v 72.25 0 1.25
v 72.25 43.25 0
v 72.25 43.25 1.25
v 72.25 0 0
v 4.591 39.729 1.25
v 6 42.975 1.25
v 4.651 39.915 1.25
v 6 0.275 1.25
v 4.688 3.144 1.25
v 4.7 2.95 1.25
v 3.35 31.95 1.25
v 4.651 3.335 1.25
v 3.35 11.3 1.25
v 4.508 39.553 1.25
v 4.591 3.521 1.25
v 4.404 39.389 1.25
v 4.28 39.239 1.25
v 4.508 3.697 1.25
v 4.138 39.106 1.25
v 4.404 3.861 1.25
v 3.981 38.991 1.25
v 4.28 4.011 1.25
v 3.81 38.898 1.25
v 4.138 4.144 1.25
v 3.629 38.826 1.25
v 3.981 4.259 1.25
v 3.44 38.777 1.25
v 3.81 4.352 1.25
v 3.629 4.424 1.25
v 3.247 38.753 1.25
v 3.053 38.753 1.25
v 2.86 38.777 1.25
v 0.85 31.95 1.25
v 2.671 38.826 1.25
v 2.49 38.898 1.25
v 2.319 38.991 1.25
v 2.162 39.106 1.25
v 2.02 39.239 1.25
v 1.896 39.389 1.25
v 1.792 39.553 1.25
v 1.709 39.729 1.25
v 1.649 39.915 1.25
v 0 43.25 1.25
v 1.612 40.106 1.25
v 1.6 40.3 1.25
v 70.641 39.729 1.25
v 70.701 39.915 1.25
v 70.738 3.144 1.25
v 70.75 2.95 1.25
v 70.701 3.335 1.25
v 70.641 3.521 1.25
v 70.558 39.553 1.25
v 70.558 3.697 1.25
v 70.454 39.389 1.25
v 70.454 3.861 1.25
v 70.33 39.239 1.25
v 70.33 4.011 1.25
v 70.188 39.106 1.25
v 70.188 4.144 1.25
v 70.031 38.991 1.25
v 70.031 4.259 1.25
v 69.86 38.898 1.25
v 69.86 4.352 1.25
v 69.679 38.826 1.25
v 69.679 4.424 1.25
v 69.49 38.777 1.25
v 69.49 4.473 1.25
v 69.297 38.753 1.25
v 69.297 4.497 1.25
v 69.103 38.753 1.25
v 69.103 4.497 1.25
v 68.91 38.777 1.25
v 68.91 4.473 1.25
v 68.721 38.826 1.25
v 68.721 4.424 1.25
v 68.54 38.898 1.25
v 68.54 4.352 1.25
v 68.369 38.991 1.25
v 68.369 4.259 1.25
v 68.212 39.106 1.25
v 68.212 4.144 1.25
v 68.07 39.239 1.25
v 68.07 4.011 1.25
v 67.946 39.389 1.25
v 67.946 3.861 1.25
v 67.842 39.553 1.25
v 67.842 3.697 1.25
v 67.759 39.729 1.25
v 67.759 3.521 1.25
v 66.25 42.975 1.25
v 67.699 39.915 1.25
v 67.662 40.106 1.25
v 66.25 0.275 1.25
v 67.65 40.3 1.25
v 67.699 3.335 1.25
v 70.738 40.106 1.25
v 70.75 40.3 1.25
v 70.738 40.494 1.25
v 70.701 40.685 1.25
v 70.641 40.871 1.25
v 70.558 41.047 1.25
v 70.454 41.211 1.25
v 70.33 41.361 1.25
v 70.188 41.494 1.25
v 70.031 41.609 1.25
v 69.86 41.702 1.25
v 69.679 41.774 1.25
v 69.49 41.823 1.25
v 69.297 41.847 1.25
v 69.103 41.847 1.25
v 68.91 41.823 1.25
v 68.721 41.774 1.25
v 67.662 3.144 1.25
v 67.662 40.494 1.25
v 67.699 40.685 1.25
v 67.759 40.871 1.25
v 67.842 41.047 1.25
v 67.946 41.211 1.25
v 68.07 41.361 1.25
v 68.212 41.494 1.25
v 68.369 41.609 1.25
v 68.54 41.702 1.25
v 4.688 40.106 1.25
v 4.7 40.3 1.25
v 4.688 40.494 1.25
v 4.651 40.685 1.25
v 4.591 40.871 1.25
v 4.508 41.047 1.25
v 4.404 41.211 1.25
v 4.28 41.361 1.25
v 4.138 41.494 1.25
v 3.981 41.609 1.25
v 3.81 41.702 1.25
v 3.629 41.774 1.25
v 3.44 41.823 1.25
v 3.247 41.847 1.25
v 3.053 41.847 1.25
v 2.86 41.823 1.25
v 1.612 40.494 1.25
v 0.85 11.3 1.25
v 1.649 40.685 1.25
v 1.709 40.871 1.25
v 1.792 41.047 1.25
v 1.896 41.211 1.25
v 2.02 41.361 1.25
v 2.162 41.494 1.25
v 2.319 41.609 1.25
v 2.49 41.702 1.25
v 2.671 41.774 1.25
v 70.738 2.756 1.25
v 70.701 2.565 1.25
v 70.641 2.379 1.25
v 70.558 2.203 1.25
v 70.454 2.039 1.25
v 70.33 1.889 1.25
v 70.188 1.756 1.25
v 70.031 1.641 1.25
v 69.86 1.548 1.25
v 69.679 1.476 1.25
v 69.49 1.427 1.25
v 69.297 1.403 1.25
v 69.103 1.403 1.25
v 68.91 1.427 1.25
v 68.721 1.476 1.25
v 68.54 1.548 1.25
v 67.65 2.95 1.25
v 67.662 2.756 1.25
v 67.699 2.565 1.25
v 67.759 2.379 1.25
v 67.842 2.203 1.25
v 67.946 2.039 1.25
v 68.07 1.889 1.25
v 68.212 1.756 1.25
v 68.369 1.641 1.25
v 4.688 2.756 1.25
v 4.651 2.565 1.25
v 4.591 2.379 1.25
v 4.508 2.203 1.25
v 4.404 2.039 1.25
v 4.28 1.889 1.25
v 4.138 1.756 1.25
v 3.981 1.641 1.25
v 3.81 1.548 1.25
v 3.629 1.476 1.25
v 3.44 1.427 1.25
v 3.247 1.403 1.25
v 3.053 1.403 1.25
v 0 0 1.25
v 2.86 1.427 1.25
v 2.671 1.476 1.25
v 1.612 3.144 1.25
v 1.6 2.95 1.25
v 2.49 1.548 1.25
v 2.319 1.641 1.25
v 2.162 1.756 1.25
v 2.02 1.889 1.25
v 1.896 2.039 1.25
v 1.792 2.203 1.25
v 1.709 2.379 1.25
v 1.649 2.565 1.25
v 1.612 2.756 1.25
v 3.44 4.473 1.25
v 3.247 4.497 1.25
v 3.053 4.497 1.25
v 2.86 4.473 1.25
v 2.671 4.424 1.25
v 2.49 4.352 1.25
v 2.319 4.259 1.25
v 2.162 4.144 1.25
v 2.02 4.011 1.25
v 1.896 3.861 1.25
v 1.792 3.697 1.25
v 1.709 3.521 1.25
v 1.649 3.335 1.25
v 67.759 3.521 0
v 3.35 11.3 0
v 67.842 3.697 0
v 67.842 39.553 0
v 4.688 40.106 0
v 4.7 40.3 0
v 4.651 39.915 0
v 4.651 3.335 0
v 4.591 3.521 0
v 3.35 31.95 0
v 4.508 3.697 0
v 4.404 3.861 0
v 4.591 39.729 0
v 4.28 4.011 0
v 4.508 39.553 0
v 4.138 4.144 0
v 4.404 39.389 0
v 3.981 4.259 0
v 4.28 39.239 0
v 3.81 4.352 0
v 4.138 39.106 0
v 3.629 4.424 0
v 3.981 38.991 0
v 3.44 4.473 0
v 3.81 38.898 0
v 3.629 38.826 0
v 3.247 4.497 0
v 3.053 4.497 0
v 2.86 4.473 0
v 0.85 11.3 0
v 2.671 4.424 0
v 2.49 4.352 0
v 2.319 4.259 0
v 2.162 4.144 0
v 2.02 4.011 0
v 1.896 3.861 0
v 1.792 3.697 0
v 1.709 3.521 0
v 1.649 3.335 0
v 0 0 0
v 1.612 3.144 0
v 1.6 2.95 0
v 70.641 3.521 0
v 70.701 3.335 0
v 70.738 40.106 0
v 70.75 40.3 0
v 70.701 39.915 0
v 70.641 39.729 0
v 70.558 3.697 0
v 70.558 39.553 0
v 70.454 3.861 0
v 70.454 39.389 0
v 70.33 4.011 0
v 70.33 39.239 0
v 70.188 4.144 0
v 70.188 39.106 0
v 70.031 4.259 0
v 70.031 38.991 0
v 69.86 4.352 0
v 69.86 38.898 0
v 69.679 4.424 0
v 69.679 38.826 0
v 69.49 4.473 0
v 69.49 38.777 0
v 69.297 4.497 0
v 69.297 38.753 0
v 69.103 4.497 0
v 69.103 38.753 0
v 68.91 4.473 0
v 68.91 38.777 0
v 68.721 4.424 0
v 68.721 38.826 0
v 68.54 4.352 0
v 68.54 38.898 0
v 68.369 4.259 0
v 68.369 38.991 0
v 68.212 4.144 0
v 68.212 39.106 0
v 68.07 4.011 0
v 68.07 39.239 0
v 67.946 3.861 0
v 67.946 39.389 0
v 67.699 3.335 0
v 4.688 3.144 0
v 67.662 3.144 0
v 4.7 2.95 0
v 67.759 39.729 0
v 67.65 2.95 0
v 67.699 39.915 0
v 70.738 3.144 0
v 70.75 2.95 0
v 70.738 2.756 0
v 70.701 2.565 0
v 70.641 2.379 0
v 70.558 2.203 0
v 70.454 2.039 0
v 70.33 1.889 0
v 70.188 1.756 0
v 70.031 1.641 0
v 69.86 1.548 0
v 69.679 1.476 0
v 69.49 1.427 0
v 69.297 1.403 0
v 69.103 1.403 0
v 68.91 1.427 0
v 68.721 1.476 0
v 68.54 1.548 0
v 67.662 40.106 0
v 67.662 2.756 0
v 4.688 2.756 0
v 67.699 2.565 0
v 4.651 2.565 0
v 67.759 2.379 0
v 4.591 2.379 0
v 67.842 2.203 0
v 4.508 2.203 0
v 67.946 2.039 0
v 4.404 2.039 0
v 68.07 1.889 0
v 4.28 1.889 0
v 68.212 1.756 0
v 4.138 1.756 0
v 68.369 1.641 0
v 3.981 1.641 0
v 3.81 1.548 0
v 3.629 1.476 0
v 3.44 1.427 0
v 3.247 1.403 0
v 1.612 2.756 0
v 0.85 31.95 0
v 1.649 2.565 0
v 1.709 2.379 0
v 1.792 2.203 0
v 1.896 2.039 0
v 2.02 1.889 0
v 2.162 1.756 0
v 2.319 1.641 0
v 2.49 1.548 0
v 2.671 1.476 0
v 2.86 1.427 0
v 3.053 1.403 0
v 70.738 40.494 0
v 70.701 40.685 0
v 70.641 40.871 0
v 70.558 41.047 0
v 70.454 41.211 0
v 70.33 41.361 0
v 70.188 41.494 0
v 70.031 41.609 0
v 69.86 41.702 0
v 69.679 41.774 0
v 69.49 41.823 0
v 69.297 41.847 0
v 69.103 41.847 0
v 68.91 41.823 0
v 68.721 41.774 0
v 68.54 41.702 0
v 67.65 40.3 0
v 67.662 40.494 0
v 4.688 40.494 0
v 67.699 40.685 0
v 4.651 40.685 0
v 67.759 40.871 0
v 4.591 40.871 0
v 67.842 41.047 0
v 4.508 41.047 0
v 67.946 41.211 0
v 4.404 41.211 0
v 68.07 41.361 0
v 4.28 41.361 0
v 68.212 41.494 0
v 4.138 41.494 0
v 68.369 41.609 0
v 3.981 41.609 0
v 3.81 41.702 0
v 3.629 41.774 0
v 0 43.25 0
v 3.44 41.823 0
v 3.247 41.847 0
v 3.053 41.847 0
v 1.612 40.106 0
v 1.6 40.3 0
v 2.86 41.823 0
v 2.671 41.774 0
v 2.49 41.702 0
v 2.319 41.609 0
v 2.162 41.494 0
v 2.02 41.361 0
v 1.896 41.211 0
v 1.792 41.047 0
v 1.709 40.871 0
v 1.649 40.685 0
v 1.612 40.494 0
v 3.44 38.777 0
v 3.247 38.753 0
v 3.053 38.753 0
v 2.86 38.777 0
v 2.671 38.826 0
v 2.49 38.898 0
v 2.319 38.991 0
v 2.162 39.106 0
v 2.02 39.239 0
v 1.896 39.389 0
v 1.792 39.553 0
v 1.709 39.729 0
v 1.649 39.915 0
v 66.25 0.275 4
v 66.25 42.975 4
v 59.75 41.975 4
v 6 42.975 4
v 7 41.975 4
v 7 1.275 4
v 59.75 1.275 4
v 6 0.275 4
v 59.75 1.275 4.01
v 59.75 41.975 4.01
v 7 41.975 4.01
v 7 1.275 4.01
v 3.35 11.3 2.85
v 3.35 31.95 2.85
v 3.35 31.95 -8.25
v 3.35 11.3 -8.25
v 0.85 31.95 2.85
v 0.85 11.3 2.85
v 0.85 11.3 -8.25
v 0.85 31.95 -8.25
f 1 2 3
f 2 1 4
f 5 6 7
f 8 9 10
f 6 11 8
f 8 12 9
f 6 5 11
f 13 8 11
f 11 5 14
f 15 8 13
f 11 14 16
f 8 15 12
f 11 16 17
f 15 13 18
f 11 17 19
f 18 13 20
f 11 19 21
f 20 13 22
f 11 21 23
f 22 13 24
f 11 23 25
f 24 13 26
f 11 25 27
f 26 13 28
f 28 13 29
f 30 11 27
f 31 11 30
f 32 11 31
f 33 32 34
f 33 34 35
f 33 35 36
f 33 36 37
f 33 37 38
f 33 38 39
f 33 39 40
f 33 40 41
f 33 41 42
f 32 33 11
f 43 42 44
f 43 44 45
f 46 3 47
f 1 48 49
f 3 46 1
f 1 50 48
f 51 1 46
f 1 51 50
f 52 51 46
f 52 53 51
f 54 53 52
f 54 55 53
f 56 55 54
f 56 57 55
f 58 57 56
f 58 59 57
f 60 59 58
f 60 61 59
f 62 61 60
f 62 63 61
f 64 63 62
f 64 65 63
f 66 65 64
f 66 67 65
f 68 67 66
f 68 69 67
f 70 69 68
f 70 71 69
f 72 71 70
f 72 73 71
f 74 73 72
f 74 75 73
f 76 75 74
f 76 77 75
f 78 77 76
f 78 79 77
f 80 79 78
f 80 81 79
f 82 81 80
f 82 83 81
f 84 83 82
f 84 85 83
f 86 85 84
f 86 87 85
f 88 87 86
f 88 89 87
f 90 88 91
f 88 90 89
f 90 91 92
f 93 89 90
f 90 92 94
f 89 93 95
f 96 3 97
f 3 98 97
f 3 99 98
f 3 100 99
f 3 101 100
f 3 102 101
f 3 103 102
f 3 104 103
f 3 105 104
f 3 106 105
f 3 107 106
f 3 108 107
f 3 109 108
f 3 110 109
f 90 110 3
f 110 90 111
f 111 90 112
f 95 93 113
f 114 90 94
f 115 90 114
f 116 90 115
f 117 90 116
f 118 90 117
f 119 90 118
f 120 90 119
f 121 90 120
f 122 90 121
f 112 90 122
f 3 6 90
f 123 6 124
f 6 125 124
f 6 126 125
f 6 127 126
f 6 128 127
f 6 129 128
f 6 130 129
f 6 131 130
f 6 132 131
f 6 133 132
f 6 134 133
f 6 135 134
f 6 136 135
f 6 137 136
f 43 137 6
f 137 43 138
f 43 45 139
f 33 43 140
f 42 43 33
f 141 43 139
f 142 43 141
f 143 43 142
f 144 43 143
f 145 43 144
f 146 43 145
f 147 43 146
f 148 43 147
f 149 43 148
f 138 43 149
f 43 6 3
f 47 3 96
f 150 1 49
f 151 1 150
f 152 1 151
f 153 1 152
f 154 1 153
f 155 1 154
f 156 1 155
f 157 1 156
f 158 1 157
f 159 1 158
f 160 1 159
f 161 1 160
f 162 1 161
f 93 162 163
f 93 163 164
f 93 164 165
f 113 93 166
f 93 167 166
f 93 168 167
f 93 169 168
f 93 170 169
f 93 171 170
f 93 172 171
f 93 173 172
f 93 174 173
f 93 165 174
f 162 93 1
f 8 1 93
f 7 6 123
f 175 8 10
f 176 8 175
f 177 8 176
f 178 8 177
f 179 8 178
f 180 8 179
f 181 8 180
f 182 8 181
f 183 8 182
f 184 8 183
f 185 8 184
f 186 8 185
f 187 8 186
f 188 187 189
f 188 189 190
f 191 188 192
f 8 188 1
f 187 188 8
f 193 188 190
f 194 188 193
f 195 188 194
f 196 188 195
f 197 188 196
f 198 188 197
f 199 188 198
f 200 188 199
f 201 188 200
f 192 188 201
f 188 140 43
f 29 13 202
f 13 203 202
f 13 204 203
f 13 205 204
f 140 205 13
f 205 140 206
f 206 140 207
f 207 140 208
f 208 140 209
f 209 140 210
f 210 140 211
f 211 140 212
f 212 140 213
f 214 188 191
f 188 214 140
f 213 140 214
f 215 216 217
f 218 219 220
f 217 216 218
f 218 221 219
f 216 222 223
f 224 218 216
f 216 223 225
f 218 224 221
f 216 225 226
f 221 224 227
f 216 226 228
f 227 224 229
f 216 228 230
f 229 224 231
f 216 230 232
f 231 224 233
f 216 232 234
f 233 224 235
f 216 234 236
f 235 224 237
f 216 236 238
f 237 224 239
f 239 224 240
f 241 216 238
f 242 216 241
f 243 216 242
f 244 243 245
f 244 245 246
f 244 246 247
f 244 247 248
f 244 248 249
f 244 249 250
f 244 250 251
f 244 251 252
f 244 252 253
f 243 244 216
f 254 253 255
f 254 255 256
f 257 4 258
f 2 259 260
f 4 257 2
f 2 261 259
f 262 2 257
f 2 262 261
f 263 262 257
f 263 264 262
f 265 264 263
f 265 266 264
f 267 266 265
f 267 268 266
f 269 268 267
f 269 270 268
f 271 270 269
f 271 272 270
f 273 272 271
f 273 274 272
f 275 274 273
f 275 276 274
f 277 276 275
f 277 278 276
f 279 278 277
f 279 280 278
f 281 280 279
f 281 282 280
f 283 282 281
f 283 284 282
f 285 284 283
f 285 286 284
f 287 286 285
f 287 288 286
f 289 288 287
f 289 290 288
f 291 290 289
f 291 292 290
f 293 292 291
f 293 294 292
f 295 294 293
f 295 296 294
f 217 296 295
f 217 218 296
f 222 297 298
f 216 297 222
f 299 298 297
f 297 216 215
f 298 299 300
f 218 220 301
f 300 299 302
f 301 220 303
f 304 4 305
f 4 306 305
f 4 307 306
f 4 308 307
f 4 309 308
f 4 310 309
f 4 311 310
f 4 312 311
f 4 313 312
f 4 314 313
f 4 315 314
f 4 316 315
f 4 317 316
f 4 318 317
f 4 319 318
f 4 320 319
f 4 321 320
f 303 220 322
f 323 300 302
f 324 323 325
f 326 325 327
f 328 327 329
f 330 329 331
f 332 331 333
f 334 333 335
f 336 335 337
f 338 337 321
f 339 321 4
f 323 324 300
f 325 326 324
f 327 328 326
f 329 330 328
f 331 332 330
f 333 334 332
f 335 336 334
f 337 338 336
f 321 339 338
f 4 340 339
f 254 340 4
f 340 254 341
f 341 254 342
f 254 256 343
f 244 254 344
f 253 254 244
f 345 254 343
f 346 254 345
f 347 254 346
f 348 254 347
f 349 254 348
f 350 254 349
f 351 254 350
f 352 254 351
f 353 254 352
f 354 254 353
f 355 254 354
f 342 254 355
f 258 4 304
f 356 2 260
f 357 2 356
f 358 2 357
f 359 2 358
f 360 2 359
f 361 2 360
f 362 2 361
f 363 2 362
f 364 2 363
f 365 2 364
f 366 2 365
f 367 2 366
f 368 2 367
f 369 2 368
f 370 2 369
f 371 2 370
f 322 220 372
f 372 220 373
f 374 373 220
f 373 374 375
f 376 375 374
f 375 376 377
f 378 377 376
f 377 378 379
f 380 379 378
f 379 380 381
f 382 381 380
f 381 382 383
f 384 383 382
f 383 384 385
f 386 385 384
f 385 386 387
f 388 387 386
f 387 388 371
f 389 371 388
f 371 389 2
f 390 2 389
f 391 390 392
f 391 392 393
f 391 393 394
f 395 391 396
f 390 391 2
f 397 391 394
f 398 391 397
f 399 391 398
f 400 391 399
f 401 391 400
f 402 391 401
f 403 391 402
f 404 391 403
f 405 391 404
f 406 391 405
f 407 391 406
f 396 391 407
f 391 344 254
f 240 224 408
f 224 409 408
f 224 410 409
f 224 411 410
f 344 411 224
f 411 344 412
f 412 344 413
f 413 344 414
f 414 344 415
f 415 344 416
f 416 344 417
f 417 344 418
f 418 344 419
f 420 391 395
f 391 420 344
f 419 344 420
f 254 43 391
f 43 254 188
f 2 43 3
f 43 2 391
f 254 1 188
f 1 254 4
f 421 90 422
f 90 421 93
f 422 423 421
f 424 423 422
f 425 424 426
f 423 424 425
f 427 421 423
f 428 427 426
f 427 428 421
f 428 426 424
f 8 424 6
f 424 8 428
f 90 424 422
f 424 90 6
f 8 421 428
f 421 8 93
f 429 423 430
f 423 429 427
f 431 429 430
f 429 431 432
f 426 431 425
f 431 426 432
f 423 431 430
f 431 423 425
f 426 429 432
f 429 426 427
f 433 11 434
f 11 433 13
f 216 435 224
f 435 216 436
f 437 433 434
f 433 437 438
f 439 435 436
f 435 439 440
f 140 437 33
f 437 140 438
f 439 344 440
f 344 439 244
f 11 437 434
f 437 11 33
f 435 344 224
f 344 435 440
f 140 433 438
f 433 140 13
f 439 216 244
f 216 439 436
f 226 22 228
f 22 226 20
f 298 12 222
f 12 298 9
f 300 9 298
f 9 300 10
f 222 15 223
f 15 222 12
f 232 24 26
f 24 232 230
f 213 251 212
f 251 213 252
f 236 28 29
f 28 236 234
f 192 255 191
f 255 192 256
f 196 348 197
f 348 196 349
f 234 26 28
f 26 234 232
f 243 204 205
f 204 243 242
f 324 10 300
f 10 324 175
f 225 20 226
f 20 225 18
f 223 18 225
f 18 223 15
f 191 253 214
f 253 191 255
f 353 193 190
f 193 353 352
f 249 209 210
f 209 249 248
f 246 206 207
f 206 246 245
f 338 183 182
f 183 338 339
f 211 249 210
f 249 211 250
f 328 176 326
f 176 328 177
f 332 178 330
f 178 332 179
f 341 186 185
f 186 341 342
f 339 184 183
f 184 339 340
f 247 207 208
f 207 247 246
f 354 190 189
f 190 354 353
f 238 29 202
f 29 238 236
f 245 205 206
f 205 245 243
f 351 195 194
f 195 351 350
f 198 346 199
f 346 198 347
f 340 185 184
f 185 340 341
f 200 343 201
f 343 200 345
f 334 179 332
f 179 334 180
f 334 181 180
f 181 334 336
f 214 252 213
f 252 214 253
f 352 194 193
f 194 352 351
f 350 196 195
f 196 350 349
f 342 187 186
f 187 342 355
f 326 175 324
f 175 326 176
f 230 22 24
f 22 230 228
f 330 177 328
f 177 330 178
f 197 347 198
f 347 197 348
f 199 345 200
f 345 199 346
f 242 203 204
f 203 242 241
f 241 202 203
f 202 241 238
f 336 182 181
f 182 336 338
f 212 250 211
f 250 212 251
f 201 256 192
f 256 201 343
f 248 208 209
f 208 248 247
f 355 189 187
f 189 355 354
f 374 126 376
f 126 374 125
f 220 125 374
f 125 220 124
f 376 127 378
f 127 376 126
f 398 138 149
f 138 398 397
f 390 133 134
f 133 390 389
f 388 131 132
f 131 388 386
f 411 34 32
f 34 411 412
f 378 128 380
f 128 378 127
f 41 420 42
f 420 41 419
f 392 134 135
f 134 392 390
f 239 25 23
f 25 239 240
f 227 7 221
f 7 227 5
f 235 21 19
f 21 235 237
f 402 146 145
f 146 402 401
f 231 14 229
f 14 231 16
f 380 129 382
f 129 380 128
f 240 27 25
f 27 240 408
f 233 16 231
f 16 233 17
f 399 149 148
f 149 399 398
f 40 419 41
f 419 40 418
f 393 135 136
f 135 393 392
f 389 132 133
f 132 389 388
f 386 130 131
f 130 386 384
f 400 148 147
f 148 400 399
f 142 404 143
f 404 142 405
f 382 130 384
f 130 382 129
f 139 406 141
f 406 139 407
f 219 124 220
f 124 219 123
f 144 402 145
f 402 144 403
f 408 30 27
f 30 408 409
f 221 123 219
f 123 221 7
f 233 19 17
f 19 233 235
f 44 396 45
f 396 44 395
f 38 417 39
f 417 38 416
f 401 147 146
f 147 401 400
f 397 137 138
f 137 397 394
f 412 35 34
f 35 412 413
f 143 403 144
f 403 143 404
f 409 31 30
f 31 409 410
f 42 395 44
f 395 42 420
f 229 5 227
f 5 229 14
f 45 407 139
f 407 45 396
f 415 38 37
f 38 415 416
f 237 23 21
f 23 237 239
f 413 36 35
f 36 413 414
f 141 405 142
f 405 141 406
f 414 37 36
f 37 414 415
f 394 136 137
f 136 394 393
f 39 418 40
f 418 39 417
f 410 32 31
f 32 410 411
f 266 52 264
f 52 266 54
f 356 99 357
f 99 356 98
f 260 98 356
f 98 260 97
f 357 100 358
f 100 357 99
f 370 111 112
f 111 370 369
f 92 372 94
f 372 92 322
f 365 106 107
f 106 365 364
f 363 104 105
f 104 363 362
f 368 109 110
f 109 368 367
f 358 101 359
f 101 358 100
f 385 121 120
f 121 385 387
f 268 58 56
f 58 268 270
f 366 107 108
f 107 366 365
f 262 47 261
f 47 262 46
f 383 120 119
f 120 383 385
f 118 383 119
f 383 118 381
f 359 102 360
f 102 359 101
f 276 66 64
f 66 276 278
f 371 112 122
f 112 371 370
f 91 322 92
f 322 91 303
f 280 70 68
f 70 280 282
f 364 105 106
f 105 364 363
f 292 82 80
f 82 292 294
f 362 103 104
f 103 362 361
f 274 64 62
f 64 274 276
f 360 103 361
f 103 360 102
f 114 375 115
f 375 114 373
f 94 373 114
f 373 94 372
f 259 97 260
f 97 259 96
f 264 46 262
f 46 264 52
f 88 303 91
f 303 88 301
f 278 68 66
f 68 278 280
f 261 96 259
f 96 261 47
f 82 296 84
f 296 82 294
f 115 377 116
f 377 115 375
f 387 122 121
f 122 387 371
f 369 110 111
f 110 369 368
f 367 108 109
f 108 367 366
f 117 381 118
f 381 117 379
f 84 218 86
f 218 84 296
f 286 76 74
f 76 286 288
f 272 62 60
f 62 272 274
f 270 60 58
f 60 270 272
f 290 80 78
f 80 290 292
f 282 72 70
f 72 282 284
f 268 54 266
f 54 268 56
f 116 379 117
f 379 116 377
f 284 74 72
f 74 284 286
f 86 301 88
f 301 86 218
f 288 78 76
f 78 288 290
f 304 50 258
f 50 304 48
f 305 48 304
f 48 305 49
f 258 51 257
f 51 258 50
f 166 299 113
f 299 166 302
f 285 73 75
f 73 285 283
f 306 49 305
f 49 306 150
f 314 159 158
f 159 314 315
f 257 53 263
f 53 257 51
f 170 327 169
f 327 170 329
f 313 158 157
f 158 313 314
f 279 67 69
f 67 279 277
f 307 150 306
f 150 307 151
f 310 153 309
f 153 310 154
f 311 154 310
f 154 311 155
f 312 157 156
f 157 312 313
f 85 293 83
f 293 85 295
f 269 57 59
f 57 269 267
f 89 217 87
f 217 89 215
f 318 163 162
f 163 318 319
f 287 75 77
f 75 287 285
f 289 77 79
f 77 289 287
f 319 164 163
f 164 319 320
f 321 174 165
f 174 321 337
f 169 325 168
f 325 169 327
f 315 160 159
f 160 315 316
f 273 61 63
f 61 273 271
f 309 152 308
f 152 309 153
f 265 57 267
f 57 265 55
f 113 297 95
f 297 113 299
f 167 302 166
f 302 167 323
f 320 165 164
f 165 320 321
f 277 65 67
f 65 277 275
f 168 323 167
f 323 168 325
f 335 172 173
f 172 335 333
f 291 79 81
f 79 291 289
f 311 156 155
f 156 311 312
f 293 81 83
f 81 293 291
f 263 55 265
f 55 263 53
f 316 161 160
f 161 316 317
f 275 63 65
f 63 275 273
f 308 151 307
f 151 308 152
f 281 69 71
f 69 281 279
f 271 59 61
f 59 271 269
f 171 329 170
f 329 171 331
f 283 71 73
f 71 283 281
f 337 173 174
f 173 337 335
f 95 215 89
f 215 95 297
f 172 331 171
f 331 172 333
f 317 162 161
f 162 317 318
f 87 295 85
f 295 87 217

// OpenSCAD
// file: configurations.scad
electronic_board_x_size = 72.25;
electronic_board_y_size = 43.25;
electronic_board_z_size = 1.25;

screen_external_x_size = 60.25;
screen_external_y_size = 42.7;
screen_external_z_size = 4 - 1.25;

throw_diameter = 3.1;

x_margin_left = 1.6 + 1.55;
x_margin_right = 1.5 + 1.55;
y_margin_top = 1.55 + 1.55;
y_margin_bottom = 1.4 + 1.55;
// main file
include <./configurations.scad>


module screen(
    electronic_board_x_size = electronic_board_x_size,
    electronic_board_y_size = electronic_board_y_size,
    electronic_board_z_size = electronic_board_z_size,
    
    screen_external_x_size = screen_external_x_size,
    screen_external_y_size = screen_external_y_size,
    screen_external_z_size = screen_external_z_size,
    
    throw_diameter = throw_diameter,
    
    x_margin_left = x_margin_left,
    x_margin_right = x_margin_right,
    y_margin_top = y_margin_top,
    y_margin_bottom = y_margin_bottom,    
    
    $fn = $fn
) {
    difference() {
        union() {
            color("RoyalBlue")
                cube(
                    [
                        electronic_board_x_size,
                        electronic_board_y_size,
                        electronic_board_z_size,
                    ]
                );
            translate([
                (electronic_board_x_size - screen_external_x_size) / 2,
                (electronic_board_y_size - screen_external_y_size) / 2,
                electronic_board_z_size
            ])
            color("white")
                cube(
                    [
                        screen_external_x_size,
                        screen_external_y_size,
                        screen_external_z_size,
                    ]
                );


            translate([
                (electronic_board_x_size - screen_external_x_size) / 2 + 1,
                (electronic_board_y_size - screen_external_y_size) / 2 + 1,
                electronic_board_z_size + 0.01
            ])
            color("black")
                cube(
                    [
                        screen_external_x_size - 1 - 6.5,
                        screen_external_y_size - 1 - 1,
                        screen_external_z_size,
                    ]
                );

            translate([0.85, 11.3, -8.25])
            cube([
                2.5,
                electronic_board_y_size - (11.3 * 2),
                8.25 + electronic_board_z_size + 1.6
            ]);
        }

        translate([x_margin_left, y_margin_bottom, - electronic_board_z_size / 2])
            cylinder(h = electronic_board_z_size * 2, d = throw_diameter, $fn = $fn);

        translate([x_margin_left, electronic_board_y_size - y_margin_bottom, - electronic_board_z_size / 2])
            cylinder(h = electronic_board_z_size * 2, d = throw_diameter, $fn = $fn);

        translate([electronic_board_x_size - x_margin_right, electronic_board_y_size - y_margin_bottom, - electronic_board_z_size / 2])
            cylinder(h = electronic_board_z_size * 2, d = throw_diameter, $fn = $fn);

        translate([electronic_board_x_size - x_margin_right, y_margin_bottom, - electronic_board_z_size / 2])
            cylinder(h = electronic_board_z_size * 2, d = throw_diameter, $fn = $fn);

    }
}

screen($fn = 50);
